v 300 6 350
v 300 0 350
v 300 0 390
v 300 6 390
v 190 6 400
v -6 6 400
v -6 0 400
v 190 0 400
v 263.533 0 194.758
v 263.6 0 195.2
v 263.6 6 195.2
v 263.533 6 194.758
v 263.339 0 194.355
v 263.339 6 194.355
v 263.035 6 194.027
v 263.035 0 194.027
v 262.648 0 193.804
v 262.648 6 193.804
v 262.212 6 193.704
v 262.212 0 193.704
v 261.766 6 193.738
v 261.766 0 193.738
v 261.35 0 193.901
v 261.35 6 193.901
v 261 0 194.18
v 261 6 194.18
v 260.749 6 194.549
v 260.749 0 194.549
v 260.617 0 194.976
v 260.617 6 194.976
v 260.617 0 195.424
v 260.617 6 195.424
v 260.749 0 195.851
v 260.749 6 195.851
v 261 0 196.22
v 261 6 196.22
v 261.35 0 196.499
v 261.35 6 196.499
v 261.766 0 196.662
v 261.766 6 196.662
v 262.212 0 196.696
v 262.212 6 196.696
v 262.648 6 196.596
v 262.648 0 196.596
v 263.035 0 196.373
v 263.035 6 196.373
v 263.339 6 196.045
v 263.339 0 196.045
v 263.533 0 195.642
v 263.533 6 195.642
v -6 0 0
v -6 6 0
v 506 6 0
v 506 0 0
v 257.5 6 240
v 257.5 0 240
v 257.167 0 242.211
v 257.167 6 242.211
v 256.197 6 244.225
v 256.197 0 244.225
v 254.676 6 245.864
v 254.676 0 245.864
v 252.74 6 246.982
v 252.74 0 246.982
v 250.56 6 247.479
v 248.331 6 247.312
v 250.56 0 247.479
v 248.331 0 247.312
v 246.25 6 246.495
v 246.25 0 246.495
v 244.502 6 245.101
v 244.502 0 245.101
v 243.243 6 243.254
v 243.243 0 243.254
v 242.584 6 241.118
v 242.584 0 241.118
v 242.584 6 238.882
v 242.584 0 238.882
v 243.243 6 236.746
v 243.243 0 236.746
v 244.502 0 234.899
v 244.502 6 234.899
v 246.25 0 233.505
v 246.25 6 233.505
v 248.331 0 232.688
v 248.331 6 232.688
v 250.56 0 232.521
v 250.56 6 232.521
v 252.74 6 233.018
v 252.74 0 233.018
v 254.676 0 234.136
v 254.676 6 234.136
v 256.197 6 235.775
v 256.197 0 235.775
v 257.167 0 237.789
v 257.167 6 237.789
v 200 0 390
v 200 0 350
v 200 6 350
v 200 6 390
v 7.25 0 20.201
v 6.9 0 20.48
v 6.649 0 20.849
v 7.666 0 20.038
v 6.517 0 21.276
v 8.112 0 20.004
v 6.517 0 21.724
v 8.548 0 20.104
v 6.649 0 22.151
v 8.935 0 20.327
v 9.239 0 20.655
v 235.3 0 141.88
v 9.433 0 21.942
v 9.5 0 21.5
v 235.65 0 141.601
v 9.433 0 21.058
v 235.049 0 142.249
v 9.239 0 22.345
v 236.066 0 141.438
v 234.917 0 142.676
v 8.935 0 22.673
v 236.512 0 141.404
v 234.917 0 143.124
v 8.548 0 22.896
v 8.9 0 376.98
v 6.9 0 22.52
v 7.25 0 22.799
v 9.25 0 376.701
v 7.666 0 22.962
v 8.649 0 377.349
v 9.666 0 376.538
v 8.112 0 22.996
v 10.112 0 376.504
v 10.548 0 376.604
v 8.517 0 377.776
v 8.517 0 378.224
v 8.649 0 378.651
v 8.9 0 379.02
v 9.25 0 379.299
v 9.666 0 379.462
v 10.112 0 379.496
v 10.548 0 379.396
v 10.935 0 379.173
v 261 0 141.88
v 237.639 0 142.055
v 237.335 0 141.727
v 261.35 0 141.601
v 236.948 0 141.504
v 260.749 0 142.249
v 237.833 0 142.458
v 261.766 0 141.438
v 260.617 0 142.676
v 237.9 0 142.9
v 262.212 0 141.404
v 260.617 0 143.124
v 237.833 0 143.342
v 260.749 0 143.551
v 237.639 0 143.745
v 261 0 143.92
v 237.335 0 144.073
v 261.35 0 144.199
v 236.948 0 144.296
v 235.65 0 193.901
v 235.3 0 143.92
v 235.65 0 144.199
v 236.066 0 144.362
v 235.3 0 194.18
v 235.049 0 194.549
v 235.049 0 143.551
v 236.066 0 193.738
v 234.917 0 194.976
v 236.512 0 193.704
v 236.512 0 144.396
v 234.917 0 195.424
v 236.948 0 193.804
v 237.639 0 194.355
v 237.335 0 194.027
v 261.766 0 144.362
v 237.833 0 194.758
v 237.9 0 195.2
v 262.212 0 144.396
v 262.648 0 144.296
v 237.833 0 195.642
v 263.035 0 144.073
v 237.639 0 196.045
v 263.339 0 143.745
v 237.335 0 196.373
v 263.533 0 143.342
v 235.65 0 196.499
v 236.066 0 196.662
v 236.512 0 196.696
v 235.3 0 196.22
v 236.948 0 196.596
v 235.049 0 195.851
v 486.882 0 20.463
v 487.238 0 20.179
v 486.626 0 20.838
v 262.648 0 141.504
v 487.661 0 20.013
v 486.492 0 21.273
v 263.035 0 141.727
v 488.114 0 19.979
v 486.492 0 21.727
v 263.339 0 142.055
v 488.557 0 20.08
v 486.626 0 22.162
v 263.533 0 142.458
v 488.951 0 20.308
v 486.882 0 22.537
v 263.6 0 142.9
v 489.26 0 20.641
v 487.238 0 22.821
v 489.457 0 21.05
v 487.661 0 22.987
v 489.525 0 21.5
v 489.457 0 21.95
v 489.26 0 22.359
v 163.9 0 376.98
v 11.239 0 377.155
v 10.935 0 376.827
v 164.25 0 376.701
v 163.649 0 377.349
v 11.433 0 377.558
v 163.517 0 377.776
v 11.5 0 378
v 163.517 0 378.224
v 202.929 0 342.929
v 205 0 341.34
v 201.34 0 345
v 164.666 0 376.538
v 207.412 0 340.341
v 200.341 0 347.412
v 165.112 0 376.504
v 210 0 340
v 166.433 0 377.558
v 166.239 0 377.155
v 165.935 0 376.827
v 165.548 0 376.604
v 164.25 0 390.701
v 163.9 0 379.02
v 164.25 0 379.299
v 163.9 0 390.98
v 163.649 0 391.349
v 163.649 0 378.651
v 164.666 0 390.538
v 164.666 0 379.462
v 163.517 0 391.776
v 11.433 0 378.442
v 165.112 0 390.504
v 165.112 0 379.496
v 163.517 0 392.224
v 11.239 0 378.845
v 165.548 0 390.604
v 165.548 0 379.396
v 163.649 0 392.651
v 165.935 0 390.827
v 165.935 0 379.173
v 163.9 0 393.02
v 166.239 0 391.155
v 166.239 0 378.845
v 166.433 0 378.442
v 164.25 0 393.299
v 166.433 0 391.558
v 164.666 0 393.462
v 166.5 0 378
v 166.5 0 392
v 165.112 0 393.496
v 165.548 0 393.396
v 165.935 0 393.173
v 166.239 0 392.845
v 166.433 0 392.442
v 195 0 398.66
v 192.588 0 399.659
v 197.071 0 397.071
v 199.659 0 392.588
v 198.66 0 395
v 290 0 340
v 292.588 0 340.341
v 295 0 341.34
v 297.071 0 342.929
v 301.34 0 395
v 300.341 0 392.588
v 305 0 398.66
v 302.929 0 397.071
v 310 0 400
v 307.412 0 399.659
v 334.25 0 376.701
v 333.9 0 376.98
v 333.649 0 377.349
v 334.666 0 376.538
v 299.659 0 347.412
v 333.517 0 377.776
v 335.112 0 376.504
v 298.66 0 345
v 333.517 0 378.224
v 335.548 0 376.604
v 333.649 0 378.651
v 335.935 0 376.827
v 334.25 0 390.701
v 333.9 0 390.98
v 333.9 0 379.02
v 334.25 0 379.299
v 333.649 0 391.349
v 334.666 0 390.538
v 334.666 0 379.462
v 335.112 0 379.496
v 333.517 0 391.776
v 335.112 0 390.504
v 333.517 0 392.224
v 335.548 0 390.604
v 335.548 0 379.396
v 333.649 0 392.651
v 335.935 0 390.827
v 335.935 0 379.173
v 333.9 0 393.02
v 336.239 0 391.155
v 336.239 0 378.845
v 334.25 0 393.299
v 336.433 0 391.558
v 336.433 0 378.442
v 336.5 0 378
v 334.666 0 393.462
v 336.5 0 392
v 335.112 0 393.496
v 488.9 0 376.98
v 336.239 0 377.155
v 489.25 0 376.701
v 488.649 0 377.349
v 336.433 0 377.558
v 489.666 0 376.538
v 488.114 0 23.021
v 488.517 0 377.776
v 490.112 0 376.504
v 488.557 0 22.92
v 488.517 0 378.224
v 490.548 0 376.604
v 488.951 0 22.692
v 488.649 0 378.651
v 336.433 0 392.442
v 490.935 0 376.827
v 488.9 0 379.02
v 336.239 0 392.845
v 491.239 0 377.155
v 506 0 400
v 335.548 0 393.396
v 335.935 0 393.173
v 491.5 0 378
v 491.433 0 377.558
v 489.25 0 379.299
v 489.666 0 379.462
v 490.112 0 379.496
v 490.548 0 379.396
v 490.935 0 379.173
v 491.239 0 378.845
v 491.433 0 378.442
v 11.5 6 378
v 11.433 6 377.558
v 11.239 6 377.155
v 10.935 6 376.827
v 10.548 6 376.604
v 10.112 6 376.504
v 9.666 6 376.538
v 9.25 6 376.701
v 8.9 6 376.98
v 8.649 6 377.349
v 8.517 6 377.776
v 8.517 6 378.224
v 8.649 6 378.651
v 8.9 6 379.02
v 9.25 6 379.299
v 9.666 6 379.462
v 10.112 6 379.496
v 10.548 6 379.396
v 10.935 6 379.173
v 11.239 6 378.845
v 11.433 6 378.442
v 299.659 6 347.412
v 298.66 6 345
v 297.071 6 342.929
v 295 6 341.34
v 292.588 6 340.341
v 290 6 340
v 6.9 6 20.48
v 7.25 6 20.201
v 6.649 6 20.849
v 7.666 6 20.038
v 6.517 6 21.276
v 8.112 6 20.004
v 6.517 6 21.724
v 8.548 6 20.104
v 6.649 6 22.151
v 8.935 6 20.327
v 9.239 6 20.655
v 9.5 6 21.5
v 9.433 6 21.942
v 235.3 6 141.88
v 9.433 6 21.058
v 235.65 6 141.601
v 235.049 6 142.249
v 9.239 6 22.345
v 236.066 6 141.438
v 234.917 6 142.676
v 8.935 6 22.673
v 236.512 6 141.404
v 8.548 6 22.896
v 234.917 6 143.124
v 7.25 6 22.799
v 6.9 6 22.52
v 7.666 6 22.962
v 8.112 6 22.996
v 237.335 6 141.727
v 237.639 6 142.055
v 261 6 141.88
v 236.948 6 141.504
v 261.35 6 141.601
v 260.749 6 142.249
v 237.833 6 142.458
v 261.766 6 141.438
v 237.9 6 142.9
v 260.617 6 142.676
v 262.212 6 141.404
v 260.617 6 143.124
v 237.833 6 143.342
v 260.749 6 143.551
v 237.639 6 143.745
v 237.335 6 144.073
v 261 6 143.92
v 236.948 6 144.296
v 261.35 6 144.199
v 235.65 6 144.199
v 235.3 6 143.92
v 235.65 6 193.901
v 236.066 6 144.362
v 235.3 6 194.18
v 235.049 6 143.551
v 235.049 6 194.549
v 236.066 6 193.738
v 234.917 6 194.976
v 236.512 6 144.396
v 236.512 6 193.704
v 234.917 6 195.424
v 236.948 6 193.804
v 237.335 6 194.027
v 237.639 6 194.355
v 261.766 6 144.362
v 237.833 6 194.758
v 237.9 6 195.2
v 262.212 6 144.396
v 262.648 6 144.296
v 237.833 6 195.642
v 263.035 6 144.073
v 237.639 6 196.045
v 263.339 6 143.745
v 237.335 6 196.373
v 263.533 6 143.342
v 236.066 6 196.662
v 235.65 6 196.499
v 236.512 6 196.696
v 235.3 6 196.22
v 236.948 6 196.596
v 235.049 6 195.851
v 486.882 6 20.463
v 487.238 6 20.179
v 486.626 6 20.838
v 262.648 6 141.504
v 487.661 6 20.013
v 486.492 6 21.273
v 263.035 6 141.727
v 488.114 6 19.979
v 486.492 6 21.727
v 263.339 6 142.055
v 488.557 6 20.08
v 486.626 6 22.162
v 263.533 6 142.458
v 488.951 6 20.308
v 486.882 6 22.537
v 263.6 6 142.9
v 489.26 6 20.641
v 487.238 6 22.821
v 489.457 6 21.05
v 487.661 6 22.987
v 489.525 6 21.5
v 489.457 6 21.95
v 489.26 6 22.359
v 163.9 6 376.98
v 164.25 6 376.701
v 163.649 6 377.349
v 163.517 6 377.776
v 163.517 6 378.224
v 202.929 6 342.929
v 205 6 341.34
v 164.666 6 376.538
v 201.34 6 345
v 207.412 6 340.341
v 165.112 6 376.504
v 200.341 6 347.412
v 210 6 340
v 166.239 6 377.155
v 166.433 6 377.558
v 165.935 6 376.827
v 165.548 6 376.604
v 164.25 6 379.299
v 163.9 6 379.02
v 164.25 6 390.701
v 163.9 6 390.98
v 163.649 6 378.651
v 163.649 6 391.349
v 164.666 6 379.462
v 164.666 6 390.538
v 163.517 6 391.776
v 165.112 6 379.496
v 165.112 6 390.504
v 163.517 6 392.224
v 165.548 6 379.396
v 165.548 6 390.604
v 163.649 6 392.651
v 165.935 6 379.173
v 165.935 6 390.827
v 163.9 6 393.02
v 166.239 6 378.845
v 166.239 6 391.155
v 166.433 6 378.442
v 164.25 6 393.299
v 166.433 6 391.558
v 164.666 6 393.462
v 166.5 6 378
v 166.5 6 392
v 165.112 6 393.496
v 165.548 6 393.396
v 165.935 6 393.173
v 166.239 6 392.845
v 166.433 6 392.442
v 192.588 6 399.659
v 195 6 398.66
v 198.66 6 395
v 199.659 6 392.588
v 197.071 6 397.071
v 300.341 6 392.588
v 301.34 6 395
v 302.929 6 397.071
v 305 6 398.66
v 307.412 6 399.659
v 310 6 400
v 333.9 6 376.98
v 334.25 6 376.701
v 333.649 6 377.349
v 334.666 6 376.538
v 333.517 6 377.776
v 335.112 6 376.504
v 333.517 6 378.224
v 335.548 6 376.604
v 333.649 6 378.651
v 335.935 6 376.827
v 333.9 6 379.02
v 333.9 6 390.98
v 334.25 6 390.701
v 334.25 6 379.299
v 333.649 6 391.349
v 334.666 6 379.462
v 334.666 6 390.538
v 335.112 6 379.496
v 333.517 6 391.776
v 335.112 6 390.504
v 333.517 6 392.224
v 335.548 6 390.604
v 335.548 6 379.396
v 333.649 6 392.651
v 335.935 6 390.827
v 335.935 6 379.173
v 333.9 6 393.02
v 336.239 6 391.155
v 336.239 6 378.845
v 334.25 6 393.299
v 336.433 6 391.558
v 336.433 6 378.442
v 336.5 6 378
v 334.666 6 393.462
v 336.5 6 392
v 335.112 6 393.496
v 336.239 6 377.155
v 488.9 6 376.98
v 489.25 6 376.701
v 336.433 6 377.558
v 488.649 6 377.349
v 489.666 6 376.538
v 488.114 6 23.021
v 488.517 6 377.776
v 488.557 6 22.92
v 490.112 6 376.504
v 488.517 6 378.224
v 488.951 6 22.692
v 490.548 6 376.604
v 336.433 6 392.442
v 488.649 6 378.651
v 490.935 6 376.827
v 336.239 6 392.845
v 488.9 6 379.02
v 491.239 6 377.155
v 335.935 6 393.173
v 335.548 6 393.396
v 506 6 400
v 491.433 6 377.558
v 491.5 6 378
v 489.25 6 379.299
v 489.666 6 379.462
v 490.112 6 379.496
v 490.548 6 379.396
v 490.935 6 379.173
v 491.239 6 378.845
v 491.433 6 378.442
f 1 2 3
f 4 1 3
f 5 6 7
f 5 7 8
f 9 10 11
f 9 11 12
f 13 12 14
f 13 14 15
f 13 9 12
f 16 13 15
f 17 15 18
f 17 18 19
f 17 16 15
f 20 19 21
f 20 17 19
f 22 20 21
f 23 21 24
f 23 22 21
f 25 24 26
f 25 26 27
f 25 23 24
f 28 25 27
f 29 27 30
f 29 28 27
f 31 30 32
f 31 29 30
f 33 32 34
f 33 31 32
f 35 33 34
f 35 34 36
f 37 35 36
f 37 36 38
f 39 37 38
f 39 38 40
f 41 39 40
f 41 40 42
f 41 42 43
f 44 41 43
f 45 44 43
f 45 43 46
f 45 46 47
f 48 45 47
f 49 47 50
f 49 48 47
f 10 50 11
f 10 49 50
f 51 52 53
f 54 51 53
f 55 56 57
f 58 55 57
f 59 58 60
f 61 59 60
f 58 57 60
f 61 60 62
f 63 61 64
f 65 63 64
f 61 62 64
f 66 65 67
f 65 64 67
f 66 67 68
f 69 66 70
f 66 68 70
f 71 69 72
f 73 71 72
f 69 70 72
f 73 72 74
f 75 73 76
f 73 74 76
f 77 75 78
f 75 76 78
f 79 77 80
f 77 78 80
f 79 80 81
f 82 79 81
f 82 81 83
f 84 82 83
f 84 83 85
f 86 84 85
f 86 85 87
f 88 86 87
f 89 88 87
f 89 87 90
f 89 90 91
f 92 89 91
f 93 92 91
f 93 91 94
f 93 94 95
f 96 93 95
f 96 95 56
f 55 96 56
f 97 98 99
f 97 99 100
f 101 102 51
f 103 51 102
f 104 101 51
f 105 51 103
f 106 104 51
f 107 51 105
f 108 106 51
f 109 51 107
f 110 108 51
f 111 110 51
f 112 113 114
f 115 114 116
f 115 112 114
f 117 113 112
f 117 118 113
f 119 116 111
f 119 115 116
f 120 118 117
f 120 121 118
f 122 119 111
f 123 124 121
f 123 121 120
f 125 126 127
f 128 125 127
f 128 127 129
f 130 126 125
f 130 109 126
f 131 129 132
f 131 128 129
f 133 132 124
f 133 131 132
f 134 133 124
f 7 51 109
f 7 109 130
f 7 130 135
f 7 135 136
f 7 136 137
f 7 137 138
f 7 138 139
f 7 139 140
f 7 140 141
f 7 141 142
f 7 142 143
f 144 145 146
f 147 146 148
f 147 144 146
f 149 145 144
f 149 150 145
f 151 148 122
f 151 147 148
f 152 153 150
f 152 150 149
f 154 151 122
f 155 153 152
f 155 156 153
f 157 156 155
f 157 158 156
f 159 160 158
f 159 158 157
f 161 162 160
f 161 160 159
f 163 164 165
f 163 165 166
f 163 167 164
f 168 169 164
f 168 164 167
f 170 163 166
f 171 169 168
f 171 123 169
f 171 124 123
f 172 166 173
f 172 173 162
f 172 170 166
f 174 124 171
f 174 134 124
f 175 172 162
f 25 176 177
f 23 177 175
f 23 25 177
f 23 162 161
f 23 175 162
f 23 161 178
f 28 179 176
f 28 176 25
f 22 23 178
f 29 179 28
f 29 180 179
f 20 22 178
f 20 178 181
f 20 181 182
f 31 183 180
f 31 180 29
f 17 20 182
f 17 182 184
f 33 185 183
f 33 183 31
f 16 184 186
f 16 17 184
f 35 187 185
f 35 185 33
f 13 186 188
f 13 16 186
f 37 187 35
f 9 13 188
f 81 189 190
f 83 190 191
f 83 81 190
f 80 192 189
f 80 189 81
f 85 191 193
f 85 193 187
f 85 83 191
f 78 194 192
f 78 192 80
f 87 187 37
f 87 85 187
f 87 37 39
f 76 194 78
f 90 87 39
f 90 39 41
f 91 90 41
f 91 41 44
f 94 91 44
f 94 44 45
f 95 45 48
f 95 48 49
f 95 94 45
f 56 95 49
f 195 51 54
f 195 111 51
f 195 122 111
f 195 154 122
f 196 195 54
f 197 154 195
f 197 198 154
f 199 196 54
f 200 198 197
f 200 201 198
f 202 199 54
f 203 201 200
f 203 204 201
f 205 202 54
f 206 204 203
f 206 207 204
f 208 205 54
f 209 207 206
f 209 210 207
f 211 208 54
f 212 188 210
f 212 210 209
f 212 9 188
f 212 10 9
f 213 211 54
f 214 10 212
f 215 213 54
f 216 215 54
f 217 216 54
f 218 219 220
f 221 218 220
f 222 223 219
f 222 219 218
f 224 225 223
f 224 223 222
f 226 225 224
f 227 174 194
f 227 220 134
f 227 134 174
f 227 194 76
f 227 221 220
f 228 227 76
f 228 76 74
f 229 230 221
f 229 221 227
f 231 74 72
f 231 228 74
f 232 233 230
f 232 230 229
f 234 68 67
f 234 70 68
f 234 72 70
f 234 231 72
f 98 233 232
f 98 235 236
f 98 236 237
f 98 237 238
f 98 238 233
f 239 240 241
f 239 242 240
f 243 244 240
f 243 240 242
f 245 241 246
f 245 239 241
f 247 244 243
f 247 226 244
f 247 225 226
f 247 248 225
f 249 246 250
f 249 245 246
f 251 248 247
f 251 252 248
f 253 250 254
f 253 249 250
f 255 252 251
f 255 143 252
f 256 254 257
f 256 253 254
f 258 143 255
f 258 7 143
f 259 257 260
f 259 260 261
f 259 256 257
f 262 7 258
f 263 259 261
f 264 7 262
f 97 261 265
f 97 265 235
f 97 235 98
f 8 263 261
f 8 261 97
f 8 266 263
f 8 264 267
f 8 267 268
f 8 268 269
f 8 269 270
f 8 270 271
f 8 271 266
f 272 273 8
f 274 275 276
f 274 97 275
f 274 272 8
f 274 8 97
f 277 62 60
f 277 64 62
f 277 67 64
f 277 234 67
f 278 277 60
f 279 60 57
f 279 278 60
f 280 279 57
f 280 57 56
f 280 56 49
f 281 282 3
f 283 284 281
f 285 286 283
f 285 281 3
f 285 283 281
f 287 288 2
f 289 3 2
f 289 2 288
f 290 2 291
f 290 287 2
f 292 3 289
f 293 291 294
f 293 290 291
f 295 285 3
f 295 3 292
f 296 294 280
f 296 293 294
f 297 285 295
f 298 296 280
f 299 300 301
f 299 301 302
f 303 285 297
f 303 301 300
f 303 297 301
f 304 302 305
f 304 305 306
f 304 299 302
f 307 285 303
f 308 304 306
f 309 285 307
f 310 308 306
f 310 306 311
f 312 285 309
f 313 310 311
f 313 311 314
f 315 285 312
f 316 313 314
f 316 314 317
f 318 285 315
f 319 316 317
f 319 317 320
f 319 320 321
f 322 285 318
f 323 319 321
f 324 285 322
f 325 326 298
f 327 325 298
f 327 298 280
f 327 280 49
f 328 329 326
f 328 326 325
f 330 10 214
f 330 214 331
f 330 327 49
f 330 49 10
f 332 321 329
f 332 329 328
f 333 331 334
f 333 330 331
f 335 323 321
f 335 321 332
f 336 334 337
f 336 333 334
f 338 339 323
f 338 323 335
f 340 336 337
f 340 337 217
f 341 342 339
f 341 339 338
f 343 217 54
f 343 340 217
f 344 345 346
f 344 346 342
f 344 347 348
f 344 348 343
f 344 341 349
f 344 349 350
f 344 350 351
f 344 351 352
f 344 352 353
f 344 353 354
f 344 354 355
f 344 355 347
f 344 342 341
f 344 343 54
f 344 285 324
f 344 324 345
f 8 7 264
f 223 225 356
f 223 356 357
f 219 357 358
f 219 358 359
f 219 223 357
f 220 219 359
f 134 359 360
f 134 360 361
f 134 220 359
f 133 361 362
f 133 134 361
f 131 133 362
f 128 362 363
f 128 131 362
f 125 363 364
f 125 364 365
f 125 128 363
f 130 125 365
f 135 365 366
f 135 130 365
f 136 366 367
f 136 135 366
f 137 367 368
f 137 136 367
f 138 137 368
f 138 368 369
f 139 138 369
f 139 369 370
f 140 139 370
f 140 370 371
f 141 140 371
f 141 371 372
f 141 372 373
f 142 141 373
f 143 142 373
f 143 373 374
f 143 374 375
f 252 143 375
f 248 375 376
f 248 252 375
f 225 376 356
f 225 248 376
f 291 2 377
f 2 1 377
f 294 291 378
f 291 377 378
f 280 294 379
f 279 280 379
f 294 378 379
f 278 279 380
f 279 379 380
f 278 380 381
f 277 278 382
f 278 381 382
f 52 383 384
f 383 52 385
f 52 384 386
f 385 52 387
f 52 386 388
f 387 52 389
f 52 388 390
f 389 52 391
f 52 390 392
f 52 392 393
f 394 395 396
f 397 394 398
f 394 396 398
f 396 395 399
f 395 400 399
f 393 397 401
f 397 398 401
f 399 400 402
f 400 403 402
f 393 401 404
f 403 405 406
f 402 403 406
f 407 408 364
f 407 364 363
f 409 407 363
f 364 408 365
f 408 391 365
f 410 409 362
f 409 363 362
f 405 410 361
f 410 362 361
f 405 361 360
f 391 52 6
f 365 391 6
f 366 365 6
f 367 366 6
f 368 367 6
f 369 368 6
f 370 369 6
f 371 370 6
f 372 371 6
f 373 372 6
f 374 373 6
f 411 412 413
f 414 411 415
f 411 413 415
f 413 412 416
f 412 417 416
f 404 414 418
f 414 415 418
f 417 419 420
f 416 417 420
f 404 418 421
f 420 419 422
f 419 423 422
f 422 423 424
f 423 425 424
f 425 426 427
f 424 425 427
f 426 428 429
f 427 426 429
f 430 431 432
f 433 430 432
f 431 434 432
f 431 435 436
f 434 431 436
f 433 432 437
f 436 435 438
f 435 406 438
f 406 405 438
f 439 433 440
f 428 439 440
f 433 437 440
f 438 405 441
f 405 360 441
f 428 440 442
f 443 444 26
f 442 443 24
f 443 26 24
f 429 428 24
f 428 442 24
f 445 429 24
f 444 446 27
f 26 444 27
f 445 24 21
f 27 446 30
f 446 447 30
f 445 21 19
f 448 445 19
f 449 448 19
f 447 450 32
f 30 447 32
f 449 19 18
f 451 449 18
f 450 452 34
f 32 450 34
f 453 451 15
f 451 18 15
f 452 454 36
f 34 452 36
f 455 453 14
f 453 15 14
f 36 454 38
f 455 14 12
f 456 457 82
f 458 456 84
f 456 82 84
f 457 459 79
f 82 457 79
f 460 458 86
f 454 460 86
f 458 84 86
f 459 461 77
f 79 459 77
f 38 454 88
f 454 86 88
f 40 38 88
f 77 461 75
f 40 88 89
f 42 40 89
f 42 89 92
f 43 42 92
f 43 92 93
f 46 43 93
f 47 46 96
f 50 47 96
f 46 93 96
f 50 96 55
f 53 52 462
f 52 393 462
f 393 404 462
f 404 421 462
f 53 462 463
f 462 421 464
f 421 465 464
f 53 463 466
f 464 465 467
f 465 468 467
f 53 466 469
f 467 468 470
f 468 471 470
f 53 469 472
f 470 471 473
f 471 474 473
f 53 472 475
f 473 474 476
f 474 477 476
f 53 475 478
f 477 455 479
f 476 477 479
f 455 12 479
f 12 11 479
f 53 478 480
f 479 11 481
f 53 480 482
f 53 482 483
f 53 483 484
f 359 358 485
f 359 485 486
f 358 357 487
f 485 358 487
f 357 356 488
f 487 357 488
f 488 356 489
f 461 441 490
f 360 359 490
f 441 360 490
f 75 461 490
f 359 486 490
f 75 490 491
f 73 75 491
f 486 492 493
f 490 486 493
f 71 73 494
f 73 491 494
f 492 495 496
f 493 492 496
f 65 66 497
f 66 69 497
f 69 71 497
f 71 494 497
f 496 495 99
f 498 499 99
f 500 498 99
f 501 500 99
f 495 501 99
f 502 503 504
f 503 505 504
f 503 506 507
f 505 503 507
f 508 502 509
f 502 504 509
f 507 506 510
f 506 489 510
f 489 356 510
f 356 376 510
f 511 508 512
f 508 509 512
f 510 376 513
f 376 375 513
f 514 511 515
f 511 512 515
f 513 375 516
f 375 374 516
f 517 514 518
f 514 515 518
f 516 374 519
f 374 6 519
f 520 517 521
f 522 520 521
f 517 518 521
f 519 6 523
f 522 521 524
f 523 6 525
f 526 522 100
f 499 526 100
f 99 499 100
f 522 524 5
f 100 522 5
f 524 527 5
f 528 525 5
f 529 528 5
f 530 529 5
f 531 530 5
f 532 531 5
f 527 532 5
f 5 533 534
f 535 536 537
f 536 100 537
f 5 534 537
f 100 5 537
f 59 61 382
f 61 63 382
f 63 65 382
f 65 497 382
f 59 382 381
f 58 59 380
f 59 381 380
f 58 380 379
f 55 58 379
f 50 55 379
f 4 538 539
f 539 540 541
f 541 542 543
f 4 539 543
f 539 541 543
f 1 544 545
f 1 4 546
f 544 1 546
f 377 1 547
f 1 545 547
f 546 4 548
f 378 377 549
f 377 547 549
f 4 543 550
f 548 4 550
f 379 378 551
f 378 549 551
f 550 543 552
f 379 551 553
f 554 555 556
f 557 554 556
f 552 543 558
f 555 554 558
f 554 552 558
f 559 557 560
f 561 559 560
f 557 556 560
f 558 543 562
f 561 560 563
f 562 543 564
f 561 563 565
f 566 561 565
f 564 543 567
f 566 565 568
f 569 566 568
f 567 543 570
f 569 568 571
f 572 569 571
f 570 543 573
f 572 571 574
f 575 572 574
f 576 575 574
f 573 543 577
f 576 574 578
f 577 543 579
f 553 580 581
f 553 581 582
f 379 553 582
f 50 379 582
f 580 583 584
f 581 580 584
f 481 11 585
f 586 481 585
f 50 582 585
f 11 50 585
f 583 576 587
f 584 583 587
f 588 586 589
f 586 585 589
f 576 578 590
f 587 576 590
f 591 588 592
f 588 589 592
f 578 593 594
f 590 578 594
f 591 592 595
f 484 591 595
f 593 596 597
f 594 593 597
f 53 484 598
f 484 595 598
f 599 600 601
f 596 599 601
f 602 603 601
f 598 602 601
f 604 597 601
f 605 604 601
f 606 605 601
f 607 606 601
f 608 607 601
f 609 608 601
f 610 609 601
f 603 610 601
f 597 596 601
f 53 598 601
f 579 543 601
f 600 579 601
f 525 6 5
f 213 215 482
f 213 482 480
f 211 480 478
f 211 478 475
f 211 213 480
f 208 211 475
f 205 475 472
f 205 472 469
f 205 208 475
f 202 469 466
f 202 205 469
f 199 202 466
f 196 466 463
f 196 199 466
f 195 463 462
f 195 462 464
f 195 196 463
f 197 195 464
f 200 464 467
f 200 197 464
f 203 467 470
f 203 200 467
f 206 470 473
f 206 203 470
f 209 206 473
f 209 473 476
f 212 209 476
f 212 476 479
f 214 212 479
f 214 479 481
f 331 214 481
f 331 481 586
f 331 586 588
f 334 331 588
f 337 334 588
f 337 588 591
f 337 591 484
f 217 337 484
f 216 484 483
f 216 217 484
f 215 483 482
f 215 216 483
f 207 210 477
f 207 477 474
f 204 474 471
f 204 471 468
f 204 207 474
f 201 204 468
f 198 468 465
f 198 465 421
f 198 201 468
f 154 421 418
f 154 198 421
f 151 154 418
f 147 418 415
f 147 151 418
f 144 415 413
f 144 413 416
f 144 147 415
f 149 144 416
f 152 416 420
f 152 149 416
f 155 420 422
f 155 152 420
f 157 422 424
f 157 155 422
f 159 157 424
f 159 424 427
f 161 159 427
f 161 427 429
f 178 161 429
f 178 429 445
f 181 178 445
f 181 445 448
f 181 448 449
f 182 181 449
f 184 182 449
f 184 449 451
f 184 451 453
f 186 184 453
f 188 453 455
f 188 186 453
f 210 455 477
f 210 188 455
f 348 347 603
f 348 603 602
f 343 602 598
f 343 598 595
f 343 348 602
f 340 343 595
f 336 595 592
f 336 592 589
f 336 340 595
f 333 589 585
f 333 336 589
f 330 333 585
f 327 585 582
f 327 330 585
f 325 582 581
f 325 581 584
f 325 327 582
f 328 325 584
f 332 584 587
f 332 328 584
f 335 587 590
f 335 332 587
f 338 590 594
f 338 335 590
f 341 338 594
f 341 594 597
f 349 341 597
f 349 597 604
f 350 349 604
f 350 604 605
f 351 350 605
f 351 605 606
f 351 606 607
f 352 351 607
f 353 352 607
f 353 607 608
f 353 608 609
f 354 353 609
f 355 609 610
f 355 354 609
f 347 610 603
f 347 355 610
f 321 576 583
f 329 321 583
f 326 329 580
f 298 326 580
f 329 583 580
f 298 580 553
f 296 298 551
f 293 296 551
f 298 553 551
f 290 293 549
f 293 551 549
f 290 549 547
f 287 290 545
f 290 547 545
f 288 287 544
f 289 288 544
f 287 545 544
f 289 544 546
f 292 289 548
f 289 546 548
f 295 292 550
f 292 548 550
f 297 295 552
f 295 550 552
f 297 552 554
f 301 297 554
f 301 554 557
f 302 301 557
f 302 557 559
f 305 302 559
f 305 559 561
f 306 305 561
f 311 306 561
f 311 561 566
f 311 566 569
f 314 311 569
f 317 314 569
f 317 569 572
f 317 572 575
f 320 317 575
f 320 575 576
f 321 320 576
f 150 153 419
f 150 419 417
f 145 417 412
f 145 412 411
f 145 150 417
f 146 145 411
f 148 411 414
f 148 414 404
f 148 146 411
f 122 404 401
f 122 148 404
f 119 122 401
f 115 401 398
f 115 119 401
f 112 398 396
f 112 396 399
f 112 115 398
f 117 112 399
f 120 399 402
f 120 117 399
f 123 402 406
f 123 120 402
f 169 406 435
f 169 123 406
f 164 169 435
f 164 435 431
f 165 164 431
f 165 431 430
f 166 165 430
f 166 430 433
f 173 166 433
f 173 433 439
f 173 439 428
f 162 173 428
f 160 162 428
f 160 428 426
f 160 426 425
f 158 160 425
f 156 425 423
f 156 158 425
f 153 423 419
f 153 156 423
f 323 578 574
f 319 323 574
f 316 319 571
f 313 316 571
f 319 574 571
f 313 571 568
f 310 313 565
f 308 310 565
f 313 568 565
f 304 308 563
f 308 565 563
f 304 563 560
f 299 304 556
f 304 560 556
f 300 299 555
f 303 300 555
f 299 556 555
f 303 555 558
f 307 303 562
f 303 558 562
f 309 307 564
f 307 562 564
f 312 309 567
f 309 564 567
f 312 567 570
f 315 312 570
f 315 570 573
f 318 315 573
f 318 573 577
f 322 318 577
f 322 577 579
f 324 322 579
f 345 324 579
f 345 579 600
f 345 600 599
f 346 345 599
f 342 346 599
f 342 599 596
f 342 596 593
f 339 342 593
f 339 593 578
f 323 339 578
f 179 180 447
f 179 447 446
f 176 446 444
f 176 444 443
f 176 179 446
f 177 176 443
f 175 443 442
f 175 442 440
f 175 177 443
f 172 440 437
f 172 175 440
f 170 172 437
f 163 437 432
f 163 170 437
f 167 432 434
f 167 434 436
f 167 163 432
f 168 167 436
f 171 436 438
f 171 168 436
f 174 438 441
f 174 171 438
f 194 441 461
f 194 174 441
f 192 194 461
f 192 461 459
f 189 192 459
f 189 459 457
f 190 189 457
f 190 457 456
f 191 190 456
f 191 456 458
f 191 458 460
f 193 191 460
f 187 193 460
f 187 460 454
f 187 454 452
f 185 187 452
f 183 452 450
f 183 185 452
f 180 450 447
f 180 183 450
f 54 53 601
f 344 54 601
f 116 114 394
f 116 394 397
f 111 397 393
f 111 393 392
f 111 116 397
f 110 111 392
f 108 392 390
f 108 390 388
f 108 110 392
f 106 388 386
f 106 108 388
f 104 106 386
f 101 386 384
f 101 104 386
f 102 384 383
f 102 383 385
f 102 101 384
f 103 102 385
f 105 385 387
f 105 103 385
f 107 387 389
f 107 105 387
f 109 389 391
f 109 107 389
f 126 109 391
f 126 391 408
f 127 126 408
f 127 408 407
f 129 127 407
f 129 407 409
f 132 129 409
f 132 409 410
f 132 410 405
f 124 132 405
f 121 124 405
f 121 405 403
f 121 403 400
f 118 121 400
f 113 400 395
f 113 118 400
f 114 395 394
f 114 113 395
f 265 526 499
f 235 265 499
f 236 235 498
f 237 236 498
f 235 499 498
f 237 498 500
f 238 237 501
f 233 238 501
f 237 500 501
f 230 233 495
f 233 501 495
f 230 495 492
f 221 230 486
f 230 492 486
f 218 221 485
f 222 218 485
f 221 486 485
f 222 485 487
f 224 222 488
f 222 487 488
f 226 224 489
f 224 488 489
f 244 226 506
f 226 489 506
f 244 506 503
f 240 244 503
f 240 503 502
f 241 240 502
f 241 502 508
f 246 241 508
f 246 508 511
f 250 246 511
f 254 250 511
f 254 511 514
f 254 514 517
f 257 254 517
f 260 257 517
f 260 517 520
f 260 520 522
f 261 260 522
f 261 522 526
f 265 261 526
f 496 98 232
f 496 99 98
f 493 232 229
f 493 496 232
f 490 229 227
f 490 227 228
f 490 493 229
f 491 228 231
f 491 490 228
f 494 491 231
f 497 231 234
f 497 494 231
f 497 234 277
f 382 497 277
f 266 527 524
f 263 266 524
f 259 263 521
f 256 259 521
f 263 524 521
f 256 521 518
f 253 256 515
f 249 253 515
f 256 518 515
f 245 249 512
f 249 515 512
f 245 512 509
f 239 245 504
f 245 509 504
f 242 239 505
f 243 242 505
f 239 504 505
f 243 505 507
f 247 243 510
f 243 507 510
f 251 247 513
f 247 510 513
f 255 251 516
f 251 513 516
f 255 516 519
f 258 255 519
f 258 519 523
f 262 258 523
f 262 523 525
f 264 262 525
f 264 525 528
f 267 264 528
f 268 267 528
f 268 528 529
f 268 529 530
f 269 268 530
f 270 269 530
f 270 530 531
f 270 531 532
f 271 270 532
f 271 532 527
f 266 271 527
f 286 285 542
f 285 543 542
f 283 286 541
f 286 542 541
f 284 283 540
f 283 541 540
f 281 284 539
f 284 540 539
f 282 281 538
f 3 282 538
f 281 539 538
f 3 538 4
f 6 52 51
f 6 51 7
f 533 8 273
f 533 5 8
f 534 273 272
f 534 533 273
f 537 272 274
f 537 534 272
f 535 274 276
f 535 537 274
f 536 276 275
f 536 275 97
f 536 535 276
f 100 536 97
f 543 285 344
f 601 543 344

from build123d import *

# Parameters (mm, degrees)
SKETCH1_W           = 500
SKETCH1_H           = 400
SKETCH1_R           = 1.5
SKETCH1_R_2         = 1.525
BOSS_EXTRUDE1_DEPTH = 6
SKETCH2_R           = 1.5
CUT_EXTRUDE1_DEPTH  = 10
SKETCH3_W           = 50
SKETCH3_H           = 60
SKETCH3_R           = 7.5
CUT_EXTRUDE2_DEPTH  = 7
FILLET1_R           = 10
BOSS_EXTRUDE2_START = -6
SKETCH4_W           = 6
SKETCH4_H           = 400
BOSS_EXTRUDE2_DEPTH = 6


with BuildPart() as part:
    # Sketch1 → Boss-Extrude1 (new body)
    with BuildSketch(Plane(origin=(0, 0, 0), x_dir=(1, 0, 0), z_dir=(0, 1, 0))):
        with Locations((250, -200)):
            Rectangle(SKETCH1_W, SKETCH1_H)
        with Locations((490, -378)):
            Circle(SKETCH1_R, mode=Mode.SUBTRACT)
        with Locations((10, -378)):
            Circle(SKETCH1_R, mode=Mode.SUBTRACT)
        with Locations((236.4, -195.2)):
            Circle(SKETCH1_R, mode=Mode.SUBTRACT)
        with Locations((262.1, -195.2)):
            Circle(SKETCH1_R, mode=Mode.SUBTRACT)
        with Locations((262.1, -142.9)):
            Circle(SKETCH1_R, mode=Mode.SUBTRACT)
        with Locations((236.4, -142.9)):
            Circle(SKETCH1_R, mode=Mode.SUBTRACT)
        with Locations((8, -21.5)):
            Circle(SKETCH1_R, mode=Mode.SUBTRACT)
        with Locations((488, -21.5)):
            Circle(SKETCH1_R_2, mode=Mode.SUBTRACT)
    extrude(amount=BOSS_EXTRUDE1_DEPTH)

    # Sketch2 → Cut-Extrude1 (cut)
    with BuildSketch(Plane(origin=(0, 6, 0), x_dir=(1, 0, 0), z_dir=(0, 1, 0))):
        with Locations((165, -378)):
            Circle(SKETCH2_R)
        with Locations((165, -392)):
            Circle(SKETCH2_R)
        with Locations((335, -378)):
            Circle(SKETCH2_R)
        with Locations((335, -392)):
            Circle(SKETCH2_R)
    extrude(amount=-CUT_EXTRUDE1_DEPTH, mode=Mode.SUBTRACT)

    # Sketch3 → Cut-Extrude2 (cut, through all)
    with BuildSketch(Plane.XZ):
        with Locations((275, 370)):
            Rectangle(SKETCH3_W, SKETCH3_H)
        with Locations((225, 370)):
            Rectangle(SKETCH3_W, SKETCH3_H)
        with Locations((250, 240)):
            Circle(SKETCH3_R)
    extrude(amount=-CUT_EXTRUDE2_DEPTH, mode=Mode.SUBTRACT)

    # Fillet1
    fillet1_edges = [part.edges().sort_by_distance(p)[0] for p in [
        (300, 3, 340),
        (200, 3, 340),
        (200, 3, 400),
        (300, 3, 400),
    ]]
    fillet(fillet1_edges, radius=FILLET1_R)

    # Sketch4 → Boss-Extrude2 (add)
    with BuildSketch(Plane.XZ.offset(BOSS_EXTRUDE2_START)):
        with Locations((-3, 200)):
            Rectangle(SKETCH4_W, SKETCH4_H)
        with Locations((503, 200)):
            Rectangle(SKETCH4_W, SKETCH4_H)
    extrude(amount=BOSS_EXTRUDE2_DEPTH)


solid = part.part
